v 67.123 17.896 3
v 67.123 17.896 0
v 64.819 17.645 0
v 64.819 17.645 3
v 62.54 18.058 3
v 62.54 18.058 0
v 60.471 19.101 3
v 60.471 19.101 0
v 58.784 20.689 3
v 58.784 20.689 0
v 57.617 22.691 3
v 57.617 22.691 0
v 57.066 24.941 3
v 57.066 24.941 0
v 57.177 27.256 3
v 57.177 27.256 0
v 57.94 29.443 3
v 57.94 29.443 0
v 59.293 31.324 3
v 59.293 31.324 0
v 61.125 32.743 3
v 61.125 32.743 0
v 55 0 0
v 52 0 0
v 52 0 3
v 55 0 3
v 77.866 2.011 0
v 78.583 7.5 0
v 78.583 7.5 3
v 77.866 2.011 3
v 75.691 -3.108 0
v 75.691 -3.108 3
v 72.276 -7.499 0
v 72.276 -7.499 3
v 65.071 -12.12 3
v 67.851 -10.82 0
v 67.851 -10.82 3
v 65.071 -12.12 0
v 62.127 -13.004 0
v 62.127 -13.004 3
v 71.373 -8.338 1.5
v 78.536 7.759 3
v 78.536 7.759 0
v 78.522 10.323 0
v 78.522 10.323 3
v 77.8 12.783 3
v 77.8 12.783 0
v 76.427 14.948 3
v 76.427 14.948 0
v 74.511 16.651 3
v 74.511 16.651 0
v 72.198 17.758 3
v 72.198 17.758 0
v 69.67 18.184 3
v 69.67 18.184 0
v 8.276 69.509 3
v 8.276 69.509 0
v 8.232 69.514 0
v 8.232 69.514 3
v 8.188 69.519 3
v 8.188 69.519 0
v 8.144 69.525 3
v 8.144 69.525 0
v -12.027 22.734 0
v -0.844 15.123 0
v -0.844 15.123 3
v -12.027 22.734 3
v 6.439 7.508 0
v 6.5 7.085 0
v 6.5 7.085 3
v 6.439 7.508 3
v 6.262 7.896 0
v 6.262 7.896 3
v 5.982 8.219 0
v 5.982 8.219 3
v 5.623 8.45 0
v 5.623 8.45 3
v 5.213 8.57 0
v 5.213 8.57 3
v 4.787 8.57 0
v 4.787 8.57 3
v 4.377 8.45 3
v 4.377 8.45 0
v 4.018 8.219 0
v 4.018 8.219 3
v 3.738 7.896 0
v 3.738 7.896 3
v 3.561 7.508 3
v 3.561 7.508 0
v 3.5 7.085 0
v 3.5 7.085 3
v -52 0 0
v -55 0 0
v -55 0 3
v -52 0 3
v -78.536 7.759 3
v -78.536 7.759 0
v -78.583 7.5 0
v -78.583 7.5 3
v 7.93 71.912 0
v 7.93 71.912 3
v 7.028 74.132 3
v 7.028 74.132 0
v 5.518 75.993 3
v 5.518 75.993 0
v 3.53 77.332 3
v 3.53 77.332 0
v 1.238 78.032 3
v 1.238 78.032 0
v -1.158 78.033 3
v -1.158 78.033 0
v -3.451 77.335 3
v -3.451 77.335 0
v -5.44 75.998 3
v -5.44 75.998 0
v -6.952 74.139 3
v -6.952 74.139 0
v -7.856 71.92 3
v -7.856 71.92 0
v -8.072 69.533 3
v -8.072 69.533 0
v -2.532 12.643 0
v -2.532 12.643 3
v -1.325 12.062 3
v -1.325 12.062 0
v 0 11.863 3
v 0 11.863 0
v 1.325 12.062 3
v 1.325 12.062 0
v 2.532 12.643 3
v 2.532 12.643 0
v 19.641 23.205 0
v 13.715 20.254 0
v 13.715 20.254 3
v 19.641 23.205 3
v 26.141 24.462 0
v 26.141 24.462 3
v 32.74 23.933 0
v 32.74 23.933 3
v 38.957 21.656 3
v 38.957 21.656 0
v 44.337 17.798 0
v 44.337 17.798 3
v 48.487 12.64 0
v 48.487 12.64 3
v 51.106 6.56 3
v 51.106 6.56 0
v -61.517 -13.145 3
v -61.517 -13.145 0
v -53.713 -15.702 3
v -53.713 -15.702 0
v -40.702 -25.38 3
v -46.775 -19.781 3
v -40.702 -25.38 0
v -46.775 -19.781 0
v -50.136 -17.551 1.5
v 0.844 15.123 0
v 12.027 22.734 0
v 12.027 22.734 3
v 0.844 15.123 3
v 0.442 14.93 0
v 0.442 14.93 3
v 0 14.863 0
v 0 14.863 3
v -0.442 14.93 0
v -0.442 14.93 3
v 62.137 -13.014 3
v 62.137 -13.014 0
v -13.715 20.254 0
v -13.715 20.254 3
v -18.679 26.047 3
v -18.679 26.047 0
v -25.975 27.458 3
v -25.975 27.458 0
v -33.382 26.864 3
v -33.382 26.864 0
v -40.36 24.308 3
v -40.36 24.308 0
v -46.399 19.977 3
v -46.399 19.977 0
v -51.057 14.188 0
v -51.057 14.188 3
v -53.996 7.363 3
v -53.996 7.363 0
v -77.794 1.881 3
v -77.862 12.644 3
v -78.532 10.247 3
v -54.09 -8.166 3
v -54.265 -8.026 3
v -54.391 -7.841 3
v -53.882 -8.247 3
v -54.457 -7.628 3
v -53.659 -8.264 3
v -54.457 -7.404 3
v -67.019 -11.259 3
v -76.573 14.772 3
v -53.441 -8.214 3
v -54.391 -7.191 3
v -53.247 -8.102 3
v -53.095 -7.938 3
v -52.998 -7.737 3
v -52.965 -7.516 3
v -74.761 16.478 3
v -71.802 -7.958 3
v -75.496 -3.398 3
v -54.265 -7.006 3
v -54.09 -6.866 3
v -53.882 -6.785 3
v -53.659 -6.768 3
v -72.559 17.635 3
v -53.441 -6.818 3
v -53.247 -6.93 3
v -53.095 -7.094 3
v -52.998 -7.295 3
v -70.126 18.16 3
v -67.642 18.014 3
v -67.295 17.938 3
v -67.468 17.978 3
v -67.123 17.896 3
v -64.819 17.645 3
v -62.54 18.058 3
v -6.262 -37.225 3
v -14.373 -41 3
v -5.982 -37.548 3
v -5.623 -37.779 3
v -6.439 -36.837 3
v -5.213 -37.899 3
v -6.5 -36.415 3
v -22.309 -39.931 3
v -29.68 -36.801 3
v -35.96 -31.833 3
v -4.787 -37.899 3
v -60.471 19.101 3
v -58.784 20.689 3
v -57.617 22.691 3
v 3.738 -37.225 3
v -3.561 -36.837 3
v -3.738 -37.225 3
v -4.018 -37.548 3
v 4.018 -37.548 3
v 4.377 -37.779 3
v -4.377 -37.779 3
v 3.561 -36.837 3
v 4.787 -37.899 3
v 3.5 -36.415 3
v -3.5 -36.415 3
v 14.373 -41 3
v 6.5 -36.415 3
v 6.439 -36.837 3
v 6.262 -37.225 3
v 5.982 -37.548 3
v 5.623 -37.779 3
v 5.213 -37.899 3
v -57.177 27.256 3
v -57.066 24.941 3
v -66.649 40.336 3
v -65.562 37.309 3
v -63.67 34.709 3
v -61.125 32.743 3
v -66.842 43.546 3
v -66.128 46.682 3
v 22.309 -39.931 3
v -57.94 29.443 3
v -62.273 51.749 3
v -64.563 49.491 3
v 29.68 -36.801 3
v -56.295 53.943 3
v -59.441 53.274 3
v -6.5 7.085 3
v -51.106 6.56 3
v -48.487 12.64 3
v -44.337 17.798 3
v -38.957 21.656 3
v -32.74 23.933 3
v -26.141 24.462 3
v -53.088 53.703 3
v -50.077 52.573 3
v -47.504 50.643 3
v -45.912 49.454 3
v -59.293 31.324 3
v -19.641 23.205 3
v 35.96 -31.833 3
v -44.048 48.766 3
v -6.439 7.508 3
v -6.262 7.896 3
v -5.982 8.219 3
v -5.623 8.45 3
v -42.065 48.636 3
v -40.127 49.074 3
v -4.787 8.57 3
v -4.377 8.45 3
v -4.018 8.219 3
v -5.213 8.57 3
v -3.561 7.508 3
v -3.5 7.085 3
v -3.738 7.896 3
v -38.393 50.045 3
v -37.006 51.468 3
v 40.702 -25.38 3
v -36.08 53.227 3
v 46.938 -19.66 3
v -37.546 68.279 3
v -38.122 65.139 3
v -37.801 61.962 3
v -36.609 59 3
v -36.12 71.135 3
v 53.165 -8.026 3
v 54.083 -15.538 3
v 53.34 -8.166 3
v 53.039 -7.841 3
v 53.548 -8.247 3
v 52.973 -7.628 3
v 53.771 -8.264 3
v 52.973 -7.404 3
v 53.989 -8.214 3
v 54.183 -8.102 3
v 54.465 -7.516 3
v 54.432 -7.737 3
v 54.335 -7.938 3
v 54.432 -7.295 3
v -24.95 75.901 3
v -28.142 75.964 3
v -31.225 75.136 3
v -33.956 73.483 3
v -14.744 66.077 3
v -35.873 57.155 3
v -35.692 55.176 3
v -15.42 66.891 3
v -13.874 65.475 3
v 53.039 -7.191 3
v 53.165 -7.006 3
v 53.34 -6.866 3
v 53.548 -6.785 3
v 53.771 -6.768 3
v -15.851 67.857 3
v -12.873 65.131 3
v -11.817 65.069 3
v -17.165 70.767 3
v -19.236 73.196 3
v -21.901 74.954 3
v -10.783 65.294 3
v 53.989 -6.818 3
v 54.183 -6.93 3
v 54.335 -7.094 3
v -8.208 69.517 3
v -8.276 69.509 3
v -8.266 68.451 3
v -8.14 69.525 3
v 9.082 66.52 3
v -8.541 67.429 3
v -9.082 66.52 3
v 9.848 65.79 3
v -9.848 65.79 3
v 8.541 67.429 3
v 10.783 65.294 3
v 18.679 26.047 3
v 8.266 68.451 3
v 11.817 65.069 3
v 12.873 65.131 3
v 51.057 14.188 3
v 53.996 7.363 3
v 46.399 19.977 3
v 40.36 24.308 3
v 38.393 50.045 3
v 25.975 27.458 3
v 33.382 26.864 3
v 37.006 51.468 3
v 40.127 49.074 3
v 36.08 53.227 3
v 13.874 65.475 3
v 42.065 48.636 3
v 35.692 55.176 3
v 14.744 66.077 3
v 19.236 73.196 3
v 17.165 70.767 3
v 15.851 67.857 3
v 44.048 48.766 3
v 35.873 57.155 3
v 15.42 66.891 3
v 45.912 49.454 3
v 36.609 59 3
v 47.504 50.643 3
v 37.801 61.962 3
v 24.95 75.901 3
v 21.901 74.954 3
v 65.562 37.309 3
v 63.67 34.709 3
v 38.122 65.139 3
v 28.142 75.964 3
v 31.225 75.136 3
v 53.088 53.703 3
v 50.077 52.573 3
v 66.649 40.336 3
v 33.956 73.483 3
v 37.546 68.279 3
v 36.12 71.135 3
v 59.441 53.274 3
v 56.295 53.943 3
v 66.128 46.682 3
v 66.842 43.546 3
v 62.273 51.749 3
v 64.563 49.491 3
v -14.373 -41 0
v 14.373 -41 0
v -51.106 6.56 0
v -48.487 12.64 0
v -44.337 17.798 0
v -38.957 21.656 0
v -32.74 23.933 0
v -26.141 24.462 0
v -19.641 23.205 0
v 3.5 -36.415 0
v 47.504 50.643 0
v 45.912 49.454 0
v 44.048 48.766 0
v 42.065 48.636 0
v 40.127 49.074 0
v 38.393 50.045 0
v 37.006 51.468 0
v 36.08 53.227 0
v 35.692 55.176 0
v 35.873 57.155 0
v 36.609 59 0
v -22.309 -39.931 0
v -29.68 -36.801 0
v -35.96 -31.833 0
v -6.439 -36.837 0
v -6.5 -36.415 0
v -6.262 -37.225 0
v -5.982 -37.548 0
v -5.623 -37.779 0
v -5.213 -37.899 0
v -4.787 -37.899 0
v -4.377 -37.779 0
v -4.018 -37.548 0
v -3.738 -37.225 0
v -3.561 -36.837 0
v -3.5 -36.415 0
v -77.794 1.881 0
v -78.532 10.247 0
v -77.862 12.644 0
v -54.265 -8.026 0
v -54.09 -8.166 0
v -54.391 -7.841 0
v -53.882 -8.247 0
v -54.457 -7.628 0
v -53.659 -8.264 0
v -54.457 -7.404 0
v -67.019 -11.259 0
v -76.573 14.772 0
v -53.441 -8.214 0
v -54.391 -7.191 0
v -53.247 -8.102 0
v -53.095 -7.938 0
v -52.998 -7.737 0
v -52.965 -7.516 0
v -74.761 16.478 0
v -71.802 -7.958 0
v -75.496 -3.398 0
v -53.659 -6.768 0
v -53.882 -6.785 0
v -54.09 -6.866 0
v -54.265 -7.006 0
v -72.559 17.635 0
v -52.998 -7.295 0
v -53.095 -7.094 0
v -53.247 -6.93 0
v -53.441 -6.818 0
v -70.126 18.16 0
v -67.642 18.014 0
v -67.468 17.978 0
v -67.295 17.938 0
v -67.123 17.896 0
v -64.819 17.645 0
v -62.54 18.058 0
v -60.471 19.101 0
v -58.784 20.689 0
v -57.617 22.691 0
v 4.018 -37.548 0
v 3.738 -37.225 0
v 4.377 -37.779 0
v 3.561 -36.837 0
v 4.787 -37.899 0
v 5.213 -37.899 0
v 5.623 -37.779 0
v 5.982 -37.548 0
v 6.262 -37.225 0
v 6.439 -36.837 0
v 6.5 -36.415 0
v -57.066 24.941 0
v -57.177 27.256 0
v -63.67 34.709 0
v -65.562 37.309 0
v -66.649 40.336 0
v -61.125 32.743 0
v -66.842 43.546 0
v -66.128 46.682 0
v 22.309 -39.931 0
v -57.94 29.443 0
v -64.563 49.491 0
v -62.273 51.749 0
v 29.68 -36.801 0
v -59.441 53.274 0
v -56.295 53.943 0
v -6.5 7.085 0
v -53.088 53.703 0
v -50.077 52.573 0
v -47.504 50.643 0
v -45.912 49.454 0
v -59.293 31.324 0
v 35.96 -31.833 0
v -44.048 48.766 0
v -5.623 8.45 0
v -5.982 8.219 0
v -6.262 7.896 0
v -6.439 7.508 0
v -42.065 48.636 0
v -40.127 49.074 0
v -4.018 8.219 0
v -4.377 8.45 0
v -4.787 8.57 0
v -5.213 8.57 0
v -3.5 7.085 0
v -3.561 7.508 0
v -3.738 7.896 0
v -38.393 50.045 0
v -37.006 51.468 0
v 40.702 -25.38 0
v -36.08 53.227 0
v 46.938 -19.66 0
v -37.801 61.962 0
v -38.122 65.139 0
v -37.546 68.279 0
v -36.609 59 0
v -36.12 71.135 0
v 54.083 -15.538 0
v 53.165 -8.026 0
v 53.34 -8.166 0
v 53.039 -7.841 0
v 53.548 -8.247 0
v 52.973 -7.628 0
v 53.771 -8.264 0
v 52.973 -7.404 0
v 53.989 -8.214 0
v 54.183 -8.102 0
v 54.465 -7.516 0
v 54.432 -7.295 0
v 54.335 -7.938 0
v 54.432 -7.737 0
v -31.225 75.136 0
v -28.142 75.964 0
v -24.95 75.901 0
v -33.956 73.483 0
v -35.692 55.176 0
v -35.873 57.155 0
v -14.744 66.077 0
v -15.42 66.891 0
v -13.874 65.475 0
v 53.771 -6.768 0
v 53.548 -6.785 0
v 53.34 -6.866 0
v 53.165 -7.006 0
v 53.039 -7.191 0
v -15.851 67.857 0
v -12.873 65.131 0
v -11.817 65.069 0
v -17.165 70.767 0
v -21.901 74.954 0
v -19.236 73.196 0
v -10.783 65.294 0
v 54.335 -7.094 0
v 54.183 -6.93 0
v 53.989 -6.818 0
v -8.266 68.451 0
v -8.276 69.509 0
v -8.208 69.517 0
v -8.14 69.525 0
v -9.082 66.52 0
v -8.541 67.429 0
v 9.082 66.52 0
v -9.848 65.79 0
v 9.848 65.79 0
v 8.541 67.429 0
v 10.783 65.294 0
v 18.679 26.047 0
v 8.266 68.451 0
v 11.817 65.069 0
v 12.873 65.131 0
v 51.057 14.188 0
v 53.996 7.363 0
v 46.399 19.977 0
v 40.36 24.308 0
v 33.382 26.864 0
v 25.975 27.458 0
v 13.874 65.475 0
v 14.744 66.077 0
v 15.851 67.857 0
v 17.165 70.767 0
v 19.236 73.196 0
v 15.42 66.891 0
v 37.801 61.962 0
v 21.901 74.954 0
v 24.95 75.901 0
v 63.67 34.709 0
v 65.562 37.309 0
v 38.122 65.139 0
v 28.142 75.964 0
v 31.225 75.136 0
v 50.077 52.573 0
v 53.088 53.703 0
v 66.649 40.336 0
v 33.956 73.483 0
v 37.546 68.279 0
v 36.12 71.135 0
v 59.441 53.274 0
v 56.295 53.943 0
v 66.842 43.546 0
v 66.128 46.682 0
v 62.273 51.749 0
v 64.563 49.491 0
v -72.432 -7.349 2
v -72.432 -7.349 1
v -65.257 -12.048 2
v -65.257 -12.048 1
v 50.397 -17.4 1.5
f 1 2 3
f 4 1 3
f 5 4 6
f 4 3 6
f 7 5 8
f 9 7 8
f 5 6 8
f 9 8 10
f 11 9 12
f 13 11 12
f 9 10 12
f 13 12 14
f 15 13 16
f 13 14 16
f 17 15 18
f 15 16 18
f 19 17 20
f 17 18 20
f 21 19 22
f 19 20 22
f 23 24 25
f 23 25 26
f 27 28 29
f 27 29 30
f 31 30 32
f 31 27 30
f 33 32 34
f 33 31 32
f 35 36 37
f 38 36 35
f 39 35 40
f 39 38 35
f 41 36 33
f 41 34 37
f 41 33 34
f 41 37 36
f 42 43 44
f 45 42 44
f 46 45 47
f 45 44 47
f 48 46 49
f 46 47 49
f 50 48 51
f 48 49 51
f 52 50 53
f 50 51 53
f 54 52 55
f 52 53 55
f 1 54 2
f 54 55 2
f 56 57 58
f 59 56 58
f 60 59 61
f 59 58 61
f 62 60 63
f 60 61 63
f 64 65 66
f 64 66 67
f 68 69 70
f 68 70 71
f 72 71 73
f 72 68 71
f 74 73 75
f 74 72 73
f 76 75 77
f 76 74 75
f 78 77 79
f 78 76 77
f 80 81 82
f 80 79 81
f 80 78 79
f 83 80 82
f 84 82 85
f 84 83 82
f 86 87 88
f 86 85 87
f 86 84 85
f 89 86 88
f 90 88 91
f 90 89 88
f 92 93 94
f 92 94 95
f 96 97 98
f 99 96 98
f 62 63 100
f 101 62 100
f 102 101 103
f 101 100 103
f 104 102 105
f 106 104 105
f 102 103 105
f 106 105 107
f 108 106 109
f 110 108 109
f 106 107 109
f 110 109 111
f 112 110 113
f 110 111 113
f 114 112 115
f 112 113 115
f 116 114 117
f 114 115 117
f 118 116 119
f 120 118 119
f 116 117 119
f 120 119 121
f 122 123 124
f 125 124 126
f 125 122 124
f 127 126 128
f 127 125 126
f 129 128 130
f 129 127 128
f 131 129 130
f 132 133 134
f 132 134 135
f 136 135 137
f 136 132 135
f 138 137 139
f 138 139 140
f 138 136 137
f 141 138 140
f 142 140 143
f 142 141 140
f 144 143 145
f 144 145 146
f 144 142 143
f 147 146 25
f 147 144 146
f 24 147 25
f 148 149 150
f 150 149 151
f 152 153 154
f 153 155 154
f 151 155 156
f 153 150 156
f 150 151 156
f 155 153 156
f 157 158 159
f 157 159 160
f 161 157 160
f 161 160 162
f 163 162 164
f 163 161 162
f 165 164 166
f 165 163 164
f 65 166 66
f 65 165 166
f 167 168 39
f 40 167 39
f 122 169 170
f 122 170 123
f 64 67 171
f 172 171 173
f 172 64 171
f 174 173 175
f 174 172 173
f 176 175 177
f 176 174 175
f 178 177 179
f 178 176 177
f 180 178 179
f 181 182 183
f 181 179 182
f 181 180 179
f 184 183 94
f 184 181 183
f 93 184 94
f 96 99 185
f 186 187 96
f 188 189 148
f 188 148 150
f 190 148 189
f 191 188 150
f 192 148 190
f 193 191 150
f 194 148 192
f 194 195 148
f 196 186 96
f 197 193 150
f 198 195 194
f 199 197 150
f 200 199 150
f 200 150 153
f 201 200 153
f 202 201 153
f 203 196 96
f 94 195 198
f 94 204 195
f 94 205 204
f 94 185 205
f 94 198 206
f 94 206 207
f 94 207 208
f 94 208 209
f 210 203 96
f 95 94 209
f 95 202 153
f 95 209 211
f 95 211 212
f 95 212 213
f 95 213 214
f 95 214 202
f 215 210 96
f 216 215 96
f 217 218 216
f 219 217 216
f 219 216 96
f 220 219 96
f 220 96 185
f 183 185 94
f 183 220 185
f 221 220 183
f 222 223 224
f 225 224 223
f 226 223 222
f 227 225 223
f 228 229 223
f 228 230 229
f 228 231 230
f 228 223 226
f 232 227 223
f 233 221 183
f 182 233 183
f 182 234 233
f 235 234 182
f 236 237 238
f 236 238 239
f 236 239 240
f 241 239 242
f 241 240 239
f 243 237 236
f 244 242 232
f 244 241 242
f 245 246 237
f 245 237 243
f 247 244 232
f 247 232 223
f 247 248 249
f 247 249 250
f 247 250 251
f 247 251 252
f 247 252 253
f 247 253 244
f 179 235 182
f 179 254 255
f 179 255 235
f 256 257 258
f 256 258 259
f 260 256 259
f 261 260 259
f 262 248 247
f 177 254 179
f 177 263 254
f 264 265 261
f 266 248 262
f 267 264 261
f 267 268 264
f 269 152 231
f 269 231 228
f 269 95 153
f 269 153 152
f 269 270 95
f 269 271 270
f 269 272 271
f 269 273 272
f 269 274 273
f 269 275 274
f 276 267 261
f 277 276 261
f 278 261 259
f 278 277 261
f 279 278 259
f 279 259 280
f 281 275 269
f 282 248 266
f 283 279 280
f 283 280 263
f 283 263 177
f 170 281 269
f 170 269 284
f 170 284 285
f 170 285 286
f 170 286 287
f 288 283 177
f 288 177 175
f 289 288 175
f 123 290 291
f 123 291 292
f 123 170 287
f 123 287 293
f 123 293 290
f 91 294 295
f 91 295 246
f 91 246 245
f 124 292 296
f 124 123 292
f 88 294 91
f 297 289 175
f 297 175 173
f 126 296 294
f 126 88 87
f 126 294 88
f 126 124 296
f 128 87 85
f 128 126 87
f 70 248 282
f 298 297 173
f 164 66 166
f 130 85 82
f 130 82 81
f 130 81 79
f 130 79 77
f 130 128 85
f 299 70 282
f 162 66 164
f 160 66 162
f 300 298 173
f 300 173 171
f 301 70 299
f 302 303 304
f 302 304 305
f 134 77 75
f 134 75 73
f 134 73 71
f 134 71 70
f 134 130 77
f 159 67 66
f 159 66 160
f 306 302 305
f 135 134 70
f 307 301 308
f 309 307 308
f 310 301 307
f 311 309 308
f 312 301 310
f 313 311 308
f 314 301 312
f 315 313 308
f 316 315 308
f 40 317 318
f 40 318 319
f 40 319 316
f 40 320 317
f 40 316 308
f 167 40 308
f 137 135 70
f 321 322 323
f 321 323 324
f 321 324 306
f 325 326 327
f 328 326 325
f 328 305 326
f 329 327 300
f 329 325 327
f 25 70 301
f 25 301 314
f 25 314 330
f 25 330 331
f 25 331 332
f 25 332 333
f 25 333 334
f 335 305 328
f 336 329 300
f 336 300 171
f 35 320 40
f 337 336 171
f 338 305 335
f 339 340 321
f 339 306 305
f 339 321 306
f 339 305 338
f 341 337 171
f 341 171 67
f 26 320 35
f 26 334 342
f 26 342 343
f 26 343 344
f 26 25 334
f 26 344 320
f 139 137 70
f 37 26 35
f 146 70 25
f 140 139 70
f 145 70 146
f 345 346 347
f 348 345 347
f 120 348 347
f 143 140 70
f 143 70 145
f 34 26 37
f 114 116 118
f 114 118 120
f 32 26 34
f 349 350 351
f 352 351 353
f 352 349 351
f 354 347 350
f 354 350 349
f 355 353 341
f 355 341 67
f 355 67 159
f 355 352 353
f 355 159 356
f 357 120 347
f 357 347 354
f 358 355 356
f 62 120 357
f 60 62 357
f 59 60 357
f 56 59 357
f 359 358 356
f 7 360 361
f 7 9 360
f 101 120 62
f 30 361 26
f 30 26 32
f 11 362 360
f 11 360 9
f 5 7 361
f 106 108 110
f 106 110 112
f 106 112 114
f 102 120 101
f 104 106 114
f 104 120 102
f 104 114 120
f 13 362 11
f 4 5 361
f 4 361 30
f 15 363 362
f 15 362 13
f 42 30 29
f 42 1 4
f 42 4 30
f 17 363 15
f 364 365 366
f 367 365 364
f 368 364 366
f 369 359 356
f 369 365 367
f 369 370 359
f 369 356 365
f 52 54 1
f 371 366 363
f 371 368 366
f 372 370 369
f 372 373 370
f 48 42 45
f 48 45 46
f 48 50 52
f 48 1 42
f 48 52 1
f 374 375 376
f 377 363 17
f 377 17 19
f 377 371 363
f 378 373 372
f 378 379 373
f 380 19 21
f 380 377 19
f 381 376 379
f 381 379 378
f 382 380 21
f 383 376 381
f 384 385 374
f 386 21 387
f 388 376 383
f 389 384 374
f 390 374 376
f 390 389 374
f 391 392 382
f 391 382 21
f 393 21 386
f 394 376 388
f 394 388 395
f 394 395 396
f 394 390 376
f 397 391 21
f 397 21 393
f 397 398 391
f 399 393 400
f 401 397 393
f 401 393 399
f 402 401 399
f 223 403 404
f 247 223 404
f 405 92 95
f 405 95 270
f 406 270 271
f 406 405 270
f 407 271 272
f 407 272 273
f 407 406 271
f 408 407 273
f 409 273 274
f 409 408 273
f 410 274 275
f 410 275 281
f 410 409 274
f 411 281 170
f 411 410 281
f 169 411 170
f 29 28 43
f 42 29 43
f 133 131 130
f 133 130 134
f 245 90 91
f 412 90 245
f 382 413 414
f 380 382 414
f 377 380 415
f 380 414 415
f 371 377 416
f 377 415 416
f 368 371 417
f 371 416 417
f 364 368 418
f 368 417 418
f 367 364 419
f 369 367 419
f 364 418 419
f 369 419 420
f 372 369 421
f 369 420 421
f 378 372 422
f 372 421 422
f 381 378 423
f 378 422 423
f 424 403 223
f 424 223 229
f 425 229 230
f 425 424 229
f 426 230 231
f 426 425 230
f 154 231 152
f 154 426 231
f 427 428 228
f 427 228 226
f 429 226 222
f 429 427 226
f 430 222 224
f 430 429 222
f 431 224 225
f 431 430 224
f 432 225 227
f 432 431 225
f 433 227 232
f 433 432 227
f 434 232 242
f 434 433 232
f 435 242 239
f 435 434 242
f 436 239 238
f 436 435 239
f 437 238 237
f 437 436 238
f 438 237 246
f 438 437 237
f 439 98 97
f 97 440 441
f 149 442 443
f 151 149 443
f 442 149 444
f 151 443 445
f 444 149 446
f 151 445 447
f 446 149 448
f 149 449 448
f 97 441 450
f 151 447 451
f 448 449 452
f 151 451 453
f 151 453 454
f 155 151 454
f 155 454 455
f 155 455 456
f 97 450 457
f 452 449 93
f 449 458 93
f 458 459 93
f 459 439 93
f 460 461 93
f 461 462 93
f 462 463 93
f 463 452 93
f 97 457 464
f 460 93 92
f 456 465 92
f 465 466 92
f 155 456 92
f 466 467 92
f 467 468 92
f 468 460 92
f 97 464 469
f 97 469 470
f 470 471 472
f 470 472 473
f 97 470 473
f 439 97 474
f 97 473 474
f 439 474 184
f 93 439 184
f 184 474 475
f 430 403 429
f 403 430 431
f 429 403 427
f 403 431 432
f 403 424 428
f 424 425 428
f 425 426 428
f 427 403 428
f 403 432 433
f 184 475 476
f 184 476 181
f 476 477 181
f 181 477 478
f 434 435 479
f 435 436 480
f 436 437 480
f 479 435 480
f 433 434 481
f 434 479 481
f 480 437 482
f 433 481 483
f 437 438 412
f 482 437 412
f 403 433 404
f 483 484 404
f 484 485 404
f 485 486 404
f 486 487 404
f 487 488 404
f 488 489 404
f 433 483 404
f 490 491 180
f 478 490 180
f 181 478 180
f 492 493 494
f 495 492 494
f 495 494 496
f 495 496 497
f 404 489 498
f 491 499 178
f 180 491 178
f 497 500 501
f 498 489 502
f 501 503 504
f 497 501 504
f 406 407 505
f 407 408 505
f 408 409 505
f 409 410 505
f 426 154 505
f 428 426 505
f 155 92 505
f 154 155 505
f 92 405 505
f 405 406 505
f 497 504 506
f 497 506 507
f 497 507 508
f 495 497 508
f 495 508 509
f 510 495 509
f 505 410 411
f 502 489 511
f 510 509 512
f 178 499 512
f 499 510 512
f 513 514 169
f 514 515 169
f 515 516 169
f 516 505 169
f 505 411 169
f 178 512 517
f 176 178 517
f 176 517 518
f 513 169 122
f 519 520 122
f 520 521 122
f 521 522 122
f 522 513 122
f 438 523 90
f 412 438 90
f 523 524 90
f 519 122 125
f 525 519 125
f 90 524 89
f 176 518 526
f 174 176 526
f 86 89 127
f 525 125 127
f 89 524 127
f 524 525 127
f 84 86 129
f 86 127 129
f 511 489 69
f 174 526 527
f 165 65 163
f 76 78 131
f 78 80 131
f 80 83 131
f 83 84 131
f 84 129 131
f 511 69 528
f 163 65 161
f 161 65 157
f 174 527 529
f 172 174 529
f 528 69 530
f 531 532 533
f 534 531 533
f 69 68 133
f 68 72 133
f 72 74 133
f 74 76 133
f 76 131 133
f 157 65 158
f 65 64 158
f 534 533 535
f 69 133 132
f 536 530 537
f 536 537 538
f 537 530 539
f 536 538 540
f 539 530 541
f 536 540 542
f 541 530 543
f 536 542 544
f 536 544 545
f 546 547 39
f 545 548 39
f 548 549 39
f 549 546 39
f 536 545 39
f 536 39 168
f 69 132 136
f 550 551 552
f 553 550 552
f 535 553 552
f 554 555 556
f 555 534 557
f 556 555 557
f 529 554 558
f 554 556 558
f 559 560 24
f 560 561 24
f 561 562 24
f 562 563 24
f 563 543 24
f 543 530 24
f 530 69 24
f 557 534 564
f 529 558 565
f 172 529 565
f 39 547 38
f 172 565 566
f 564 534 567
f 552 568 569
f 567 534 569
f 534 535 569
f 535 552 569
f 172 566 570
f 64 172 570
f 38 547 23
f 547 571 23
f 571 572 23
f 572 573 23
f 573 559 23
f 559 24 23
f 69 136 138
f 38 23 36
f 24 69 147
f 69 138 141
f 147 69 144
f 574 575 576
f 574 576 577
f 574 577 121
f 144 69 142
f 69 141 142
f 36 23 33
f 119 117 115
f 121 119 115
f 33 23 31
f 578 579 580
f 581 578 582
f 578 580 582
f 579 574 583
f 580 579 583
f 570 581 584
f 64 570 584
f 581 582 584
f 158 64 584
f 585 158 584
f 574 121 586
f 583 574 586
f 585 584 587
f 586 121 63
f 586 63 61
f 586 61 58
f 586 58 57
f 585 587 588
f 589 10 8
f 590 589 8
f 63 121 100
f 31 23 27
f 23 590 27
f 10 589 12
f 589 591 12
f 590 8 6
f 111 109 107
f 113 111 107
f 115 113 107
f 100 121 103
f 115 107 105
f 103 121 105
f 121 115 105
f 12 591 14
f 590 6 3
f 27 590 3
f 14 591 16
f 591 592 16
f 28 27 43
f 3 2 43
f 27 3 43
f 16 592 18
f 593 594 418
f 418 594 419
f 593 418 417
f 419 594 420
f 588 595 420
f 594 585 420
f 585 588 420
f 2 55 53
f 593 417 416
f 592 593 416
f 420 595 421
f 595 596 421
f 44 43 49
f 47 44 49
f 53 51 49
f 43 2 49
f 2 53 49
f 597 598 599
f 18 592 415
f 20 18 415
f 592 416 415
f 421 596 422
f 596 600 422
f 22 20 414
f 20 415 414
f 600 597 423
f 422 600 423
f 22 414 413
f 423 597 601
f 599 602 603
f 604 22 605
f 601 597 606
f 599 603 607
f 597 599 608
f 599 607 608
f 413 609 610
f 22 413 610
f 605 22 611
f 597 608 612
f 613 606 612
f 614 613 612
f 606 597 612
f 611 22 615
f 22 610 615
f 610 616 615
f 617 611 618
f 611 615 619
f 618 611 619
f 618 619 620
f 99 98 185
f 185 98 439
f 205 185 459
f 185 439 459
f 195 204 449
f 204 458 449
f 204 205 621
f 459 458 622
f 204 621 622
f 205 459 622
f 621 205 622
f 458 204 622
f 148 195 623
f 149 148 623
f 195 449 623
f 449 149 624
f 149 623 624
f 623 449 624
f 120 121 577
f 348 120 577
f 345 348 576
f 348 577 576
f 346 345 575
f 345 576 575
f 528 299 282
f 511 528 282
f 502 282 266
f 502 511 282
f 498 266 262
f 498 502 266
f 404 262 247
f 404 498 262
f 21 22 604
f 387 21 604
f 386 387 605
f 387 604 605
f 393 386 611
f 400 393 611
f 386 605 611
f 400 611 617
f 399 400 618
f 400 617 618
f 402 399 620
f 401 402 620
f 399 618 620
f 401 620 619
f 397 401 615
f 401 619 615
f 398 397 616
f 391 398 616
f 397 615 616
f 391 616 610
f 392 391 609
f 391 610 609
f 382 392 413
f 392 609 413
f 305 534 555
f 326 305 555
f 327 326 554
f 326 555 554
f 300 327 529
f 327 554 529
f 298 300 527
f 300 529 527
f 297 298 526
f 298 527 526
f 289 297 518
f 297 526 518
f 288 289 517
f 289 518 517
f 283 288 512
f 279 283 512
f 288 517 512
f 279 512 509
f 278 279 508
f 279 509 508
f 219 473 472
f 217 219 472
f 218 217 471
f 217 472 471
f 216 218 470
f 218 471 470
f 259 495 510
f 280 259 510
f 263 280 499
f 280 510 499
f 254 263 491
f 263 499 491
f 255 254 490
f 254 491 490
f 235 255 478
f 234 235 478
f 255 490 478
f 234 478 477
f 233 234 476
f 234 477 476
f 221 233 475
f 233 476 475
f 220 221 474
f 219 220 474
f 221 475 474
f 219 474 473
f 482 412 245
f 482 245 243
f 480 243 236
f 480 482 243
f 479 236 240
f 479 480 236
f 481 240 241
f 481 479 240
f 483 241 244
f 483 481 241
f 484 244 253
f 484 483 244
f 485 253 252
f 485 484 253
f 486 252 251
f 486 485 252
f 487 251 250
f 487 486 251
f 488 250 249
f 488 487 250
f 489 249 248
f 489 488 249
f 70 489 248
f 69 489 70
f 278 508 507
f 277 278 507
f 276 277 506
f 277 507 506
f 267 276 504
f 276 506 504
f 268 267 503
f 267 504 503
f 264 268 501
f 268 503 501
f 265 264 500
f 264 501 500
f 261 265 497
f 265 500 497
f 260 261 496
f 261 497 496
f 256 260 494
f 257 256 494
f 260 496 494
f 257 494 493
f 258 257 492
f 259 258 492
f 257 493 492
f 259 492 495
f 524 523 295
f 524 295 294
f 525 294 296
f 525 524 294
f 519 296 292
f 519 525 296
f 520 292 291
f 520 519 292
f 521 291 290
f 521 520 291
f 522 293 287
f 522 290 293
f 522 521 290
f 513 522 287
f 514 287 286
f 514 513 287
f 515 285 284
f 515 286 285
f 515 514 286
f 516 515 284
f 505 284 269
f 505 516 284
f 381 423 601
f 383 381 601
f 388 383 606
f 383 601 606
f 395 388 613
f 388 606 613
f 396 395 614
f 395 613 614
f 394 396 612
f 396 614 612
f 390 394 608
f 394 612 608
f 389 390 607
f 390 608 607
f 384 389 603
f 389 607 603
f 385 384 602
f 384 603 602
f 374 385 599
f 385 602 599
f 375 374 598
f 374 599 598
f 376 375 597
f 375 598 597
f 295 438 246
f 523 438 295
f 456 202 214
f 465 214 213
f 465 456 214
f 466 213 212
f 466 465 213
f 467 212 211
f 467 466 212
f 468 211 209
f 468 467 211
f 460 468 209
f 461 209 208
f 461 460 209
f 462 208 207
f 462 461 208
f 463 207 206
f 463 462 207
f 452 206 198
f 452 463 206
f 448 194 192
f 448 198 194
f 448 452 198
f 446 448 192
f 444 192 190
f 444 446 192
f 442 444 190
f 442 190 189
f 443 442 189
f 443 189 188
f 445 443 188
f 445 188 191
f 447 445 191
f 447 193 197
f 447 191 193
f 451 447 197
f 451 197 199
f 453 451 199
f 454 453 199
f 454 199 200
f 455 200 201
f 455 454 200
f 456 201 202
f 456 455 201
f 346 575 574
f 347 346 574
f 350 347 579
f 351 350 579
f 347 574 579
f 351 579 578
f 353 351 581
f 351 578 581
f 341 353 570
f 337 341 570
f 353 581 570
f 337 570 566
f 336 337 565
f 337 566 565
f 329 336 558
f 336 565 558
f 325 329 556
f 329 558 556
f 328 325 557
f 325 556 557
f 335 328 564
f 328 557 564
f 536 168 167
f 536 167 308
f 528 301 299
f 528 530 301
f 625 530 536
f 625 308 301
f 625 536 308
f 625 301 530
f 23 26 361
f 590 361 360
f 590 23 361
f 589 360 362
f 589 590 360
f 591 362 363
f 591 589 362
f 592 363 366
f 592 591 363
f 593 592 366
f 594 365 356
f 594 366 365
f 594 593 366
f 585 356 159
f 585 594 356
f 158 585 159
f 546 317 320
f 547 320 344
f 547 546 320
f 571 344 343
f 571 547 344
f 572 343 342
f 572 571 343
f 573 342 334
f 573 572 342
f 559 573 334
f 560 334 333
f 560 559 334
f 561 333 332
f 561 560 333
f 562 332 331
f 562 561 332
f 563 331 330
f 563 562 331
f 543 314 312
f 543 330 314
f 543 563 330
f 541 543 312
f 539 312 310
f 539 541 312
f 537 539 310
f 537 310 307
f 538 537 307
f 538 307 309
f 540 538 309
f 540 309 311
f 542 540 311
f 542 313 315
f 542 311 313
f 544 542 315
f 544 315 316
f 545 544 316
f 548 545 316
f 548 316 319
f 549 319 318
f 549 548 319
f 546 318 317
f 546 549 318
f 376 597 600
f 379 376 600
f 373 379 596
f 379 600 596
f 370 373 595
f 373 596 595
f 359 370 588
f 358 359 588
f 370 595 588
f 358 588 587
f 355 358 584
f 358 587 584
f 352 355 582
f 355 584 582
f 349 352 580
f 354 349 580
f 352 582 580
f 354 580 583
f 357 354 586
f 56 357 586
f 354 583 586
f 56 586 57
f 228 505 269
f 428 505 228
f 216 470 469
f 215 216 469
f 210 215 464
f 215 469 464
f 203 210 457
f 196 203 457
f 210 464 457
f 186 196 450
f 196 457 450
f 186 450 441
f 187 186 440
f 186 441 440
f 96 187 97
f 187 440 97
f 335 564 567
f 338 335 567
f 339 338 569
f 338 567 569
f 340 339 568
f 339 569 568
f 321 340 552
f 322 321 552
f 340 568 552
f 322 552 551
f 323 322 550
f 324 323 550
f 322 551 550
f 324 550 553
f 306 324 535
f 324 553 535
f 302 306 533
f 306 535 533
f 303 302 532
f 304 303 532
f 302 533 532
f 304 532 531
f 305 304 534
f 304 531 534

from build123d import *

# Parameters (mm, degrees)
BOSS_EXTRUDE3_DEPTH      = 3
BOSS_EXTRUDE4_DEPTH      = 3
CUT_EXTRUDE11_DEPTH      = 111.873556651
CUT_EXTRUDE11_DEPTH_BACK = 111.873556651
SKETCH6_W                = 30
SKETCH6_H                = 41
BOSS_EXTRUDE5_DEPTH      = 40
SKETCH7_W                = 88.745964224
SKETCH7_H                = 3
BOSS_EXTRUDE6_DEPTH      = 41
CUT_EXTRUDE12_DEPTH      = 118.830155579
CUT_EXTRUDE12_DEPTH_BACK = 118.830155579
BOSS_EXTRUDE7_DEPTH      = 3
CUT_EXTRUDE13_START      = 3
SKETCH11_W               = 10
SKETCH11_H               = 13.79344676
CUT_EXTRUDE13_DEPTH      = 41
SKETCH12_R               = 1.55
CUT_EXTRUDE14_DEPTH      = 118.830155613
CUT_EXTRUDE14_DEPTH_BACK = 118.830155613
SKETCH13_R               = 0.75
CUT_EXTRUDE15_DEPTH      = 118.830155613
CUT_EXTRUDE15_DEPTH_BACK = 118.830155613
CUT_EXTRUDE17_START      = 3
SKETCH14_W               = 30.416262865
SKETCH14_H               = 42.907687787
CUT_EXTRUDE17_DEPTH      = 41
SKETCH16_R               = 1.5
CUT_EXTRUDE19_DEPTH      = 111.873556651
CUT_EXTRUDE19_DEPTH_BACK = 111.873556651


with BuildPart() as part:
    # Sketch2 → Boss-Extrude3 (new body)
    with BuildSketch(Plane.XY):
        with BuildLine():
            ThreePointArc((47.50430531, 50.643316247), (38.392532309, 50.044854207), (36.609276159, 59.000442494))
            ThreePointArc((36.609276159, 59.000442494), (31.22500556, 75.135535905), (15.851175796, 67.857008055))
            ThreePointArc((15.851175796, 67.857008055), (11.292148271, 65.146162721), (8.27578906, 69.509073619))
            ThreePointArc((8.27578906, 69.509073619), (8.209835801, 69.516894322), (8.143875152, 69.524652444))
            ThreePointArc((8.143875152, 69.524652444), (0.040205316, 78.121761213), (-8.072309219, 69.532998094))
            ThreePointArc((-8.072309219, 69.532998094), (-8.174057892, 69.521110302), (-8.27578906, 69.509073619))
            ThreePointArc((-8.27578906, 69.509073619), (-11.292148299, 65.146162715), (-15.851175812, 67.857008111))
            ThreePointArc((-15.851175812, 67.857008111), (-31.225005545, 75.135535912), (-36.609276205, 59.000442573))
            ThreePointArc((-36.609276205, 59.000442573), (-38.39253227, 50.044854237), (-47.504305306, 50.643316242))
            ThreePointArc((-47.504305306, 50.643316242), (-64.562942613, 49.491387864), (-61.124617501, 32.743194941))
            ThreePointArc((-61.124617501, 32.743194941), (-57.616854175, 22.690844698), (-67.122680626, 17.895700022))
            ThreePointArc((-67.122680626, 17.895700022), (-67.381711192, 17.958536274), (-67.642453618, 18.013841027))
            ThreePointArc((-67.642453618, 18.013841027), (-78.427805312, 10.854202298), (-71.372982112, 0))
            Line((-71.372982112, 0), (71.372982112, 0))
            ThreePointArc((71.372982112, 0), (78.369977301, 11.114396723), (67.122680666, 17.895700032))
            ThreePointArc((67.122680666, 17.895700032), (57.616854183, 22.690844679), (61.124617501, 32.743194941))
            ThreePointArc((61.124617501, 32.743194941), (64.562942615, 49.491387862), (47.50430531, 50.643316247))
        make_face()
    extrude(amount=BOSS_EXTRUDE3_DEPTH)

    # Sketch4 → Boss-Extrude4 (add)
    with BuildSketch(Plane.XY):
        with BuildLine():
            Line((-44.372982112, 0), (-57.872982112, 0))
            Line((-57.872982112, 0), (-57.872982112, -13.5))
            ThreePointArc((-57.872982112, -13.5), (-50.941516146, -11.584678656), (-45.97686273, -6.382189564))
            ThreePointArc((-45.97686273, -6.382189564), (-45.287489461, -3.162806043), (-44.372982112, 0))
        make_face()
        with BuildLine():
            Line((-57.872982112, -13.5), (-57.872982112, 0))
            Line((-57.872982112, 0), (-71.372982112, 0))
            ThreePointArc((-71.372982112, 0), (-67.418923658, -9.545941546), (-57.872982112, -13.5))
        make_face()
        with BuildLine():
            Line((-57.872982112, -13.502334306), (-57.872982112, -13.5))
            ThreePointArc((-57.872982112, -13.5), (-67.418923658, -9.545941546), (-71.372982112, 0))
            ThreePointArc((-71.372982112, 0), (-72.451224877, 0.304022071), (-73.484512677, 0.73686523))
            ThreePointArc((-73.484512677, 0.73686523), (-74.477917841, 1.305497745), (-75.393009288, 1.993105481))
            ThreePointArc((-75.393009288, 1.993105481), (-76.19177077, 2.763005392), (-76.892036557, 3.623466668))
            ThreePointArc((-76.892036557, 3.623466668), (-77.482473018, 4.559883509), (-77.956141708, 5.560448192))
            ThreePointArc((-77.956141708, 5.560448192), (-78.314438673, 6.641735343), (-78.536342603, 7.759016536))
            Line((-78.536342603, 7.759016536), (-78.5829279, 7.5))
            add(Edge.make_bspline(
                [(-78.5829279, 7.5), (-78.619378381, 2.110973886), (-75.05397773, -6.403058313), (-65.775580858, -12.380201513), (-60.383408465, -13.5022688), (-57.872982112, -13.502334306)],
                knots=[0, 0, 0, 0, 0.497531388, 0.760341967, 0.99111058, 0.99111058, 0.99111058, 0.99111058], degree=3))
        make_face()
        with BuildLine():
            Line((57.872982112, 0), (44.372982112, 0))
            ThreePointArc((44.372982112, 0), (45.287489461, -3.162806043), (45.97686273, -6.382189564))
            ThreePointArc((45.97686273, -6.382189564), (50.899542414, -11.559461007), (57.775049798, -13.499644783))
            add(Edge.make_bspline(
                [(57.872982112, -13.498764325), (57.840342719, -13.499136412), (57.807698516, -13.49942994), (57.775049798, -13.499644783)],
                knots=[0.991262366, 0.991262366, 0.991262366, 0.991262366, 0.994213276, 0.994213276, 0.994213276, 0.994213276], degree=3))
            Line((57.872982112, -13.498764325), (57.872982112, 0))
        make_face()
        with BuildLine():
            Line((71.372982112, 0), (57.872982112, 0))
            Line((57.872982112, 0), (57.872982112, -13.498764325))
            add(Edge.make_bspline(
                [(58.880524263, -13.462349677), (58.545403195, -13.482744614), (58.209448198, -13.494928627), (57.872982112, -13.498764325)],
                knots=[0.960842647, 0.960842647, 0.960842647, 0.960842647, 0.991262366, 0.991262366, 0.991262366, 0.991262366], degree=3))
            ThreePointArc((58.880524263, -13.462349677), (67.768734207, -9.182814954), (71.372982112, 0))
        make_face()
        with BuildLine():
            ThreePointArc((73.484512677, 0.73686523), (72.451224877, 0.304022071), (71.372982112, 0))
            ThreePointArc((71.372982112, 0), (67.768734207, -9.182814954), (58.880524263, -13.462349677))
            add(Edge.make_bspline(
                [(78.5829279, 7.5), (78.674659632, 1.535679134), (73.703653617, -8.978697254), (63.479979045, -13.182434147), (58.880524263, -13.462349677)],
                knots=[0, 0, 0, 0, 0.543339428, 0.960842647, 0.960842647, 0.960842647, 0.960842647], degree=3))
            Line((78.5829279, 7.5), (78.536342603, 7.759016536))
            ThreePointArc((78.536342603, 7.759016536), (78.314438673, 6.641735343), (77.956141708, 5.560448192))
            ThreePointArc((77.956141708, 5.560448192), (77.482473018, 4.559883509), (76.892036557, 3.623466668))
            ThreePointArc((76.892036557, 3.623466668), (76.19177077, 2.763005392), (75.393009288, 1.993105481))
            ThreePointArc((75.393009288, 1.993105481), (74.477917841, 1.305497745), (73.484512677, 0.73686523))
        make_face()
    extrude(amount=BOSS_EXTRUDE4_DEPTH)

    # Sketch5 → Cut-Extrude11 (cut, two sides)
    with BuildSketch(Plane.XY) as cut_extrude11_sk:
        with BuildLine():
            ThreePointArc((-12.027368937, 22.734284418), (-40.359872584, 24.307893309), (-55, 0))
            Line((-55, 0), (-52, 0))
            ThreePointArc((-52, 0), (-38.956977393, 21.65612313), (-13.715292326, 20.254180663))
            Line((-13.715292326, 20.254180663), (-2.531885083, 12.64291254))
            ThreePointArc((-2.531885083, 12.64291254), (0, 11.863068172), (2.531885083, 12.64291254))
            Line((2.531885083, 12.64291254), (13.715292326, 20.254180663))
            ThreePointArc((13.715292326, 20.254180663), (38.956977393, 21.65612313), (52, 0))
            Line((52, 0), (55, 0))
            ThreePointArc((55, 0), (40.359872584, 24.307893309), (12.027368937, 22.734284418))
            Line((12.027368937, 22.734284418), (0.843961694, 15.123016295))
            ThreePointArc((0.843961694, 15.123016295), (0, 14.863068172), (-0.843961694, 15.123016295))
            Line((-0.843961694, 15.123016295), (-12.027368937, 22.734284418))
        make_face()
    extrude(amount=CUT_EXTRUDE11_DEPTH, mode=Mode.SUBTRACT)
    extrude(cut_extrude11_sk.sketch, amount=-CUT_EXTRUDE11_DEPTH_BACK, mode=Mode.SUBTRACT)

    # Sketch6 → Boss-Extrude5 (add)
    with BuildSketch(Plane.XY):
        with Locations((0, -20.5)):
            Rectangle(SKETCH6_W, SKETCH6_H)
    extrude(amount=BOSS_EXTRUDE5_DEPTH)

    # Sketch7 → Boss-Extrude6 (add)
    with BuildSketch(Plane(origin=(0, 0, 0), x_dir=(1, 0, 0), z_dir=(0, 1, 0))):
        with Locations((0, -1.5)):
            Rectangle(SKETCH7_W, SKETCH7_H)
    extrude(amount=-BOSS_EXTRUDE6_DEPTH)

    # Sketch8 → Cut-Extrude12 (cut, two sides)
    with BuildSketch(Plane.XY) as cut_extrude12_sk:
        with BuildLine():
            Line((44.372982112, -41), (44.372982112, -11))
            ThreePointArc((44.372982112, -11), (35.586185548, -32.213203436), (14.372982112, -41))
            Line((14.372982112, -41), (44.372982112, -41))
        make_face()
        with BuildLine():
            Line((0, -46.518418556), (0, -41))
            Line((0, -41), (-14.372982112, -41))
            ThreePointArc((-14.372982112, -41), (-35.586185548, -32.213203436), (-44.372982112, -11))
            Line((-44.372982112, -11), (-44.372982112, -46.518418556))
            Line((-44.372982112, -46.518418556), (0, -46.518418556))
        make_face()
        Polygon((44.372982112, -46.518418556), (44.372982112, -41), (14.372982112, -41), (0, -41), (0, -46.518418556), align=None)
    extrude(amount=CUT_EXTRUDE12_DEPTH, mode=Mode.SUBTRACT)
    extrude(cut_extrude12_sk.sketch, amount=-CUT_EXTRUDE12_DEPTH_BACK, mode=Mode.SUBTRACT)

    # Sketch10 → Boss-Extrude7 (add)
    with BuildSketch(Plane.XY):
        with BuildLine():
            Line((-62.137396583, -13.014276789), (-43.035731637, 6.087388157))
            Line((-43.035731637, 6.087388157), (-28.63207452, -11.418368831))
            Line((-28.63207452, -11.418368831), (-35.806723464, -31.990348537))
            add(Edge.make_bspline(
                [(-62.137396583, -13.014276789), (-45.493525683, -16.38886663), (-35.806723464, -31.990348537)],
                knots=[0, 0, 0, 1, 1, 1], degree=2))
        make_face()
        with BuildLine():
            Line((43.035731637, 6.087388157), (28.63207452, -11.418368831))
            Line((28.63207452, -11.418368831), (35.806723464, -31.990348537))
            add(Edge.make_bspline(
                [(62.137396583, -13.014276789), (45.493525683, -16.38886663), (35.806723464, -31.990348537)],
                knots=[0, 0, 0, 1, 1, 1], degree=2))
            Line((62.137396583, -13.014276789), (43.035731637, 6.087388157))
        make_face()
    extrude(amount=BOSS_EXTRUDE7_DEPTH)

    # Sketch11 → Cut-Extrude13 (cut)
    with BuildSketch(Plane.XY.offset(CUT_EXTRUDE13_START)):
        with Locations((-10, -20.49672338)):
            Rectangle(SKETCH11_W, SKETCH11_H)
        with Locations((10, -20.49672338)):
            Rectangle(SKETCH11_W, SKETCH11_H)
    extrude(amount=CUT_EXTRUDE13_DEPTH, mode=Mode.SUBTRACT)

    # Sketch12 → Cut-Extrude14 (cut, two sides)
    with BuildSketch(Plane(origin=(0, 0, 0), x_dir=(1, 0, 0), z_dir=(0, 1, 0))) as cut_extrude14_sk:
        with Locations(Location((0, -24, 0), (0, 0, 270))):
            Circle(SKETCH12_R)
    extrude(amount=CUT_EXTRUDE14_DEPTH, mode=Mode.SUBTRACT)
    extrude(cut_extrude14_sk.sketch, amount=-CUT_EXTRUDE14_DEPTH_BACK, mode=Mode.SUBTRACT)

    # Sketch13 → Cut-Extrude15 (cut, two sides)
    with BuildSketch(Plane.XY) as cut_extrude15_sk:
        with Locations((-53.715002972, -7.515993868)):
            Circle(SKETCH13_R)
        with Locations((53.715002972, -7.515993868)):
            Circle(SKETCH13_R)
    extrude(amount=CUT_EXTRUDE15_DEPTH, mode=Mode.SUBTRACT)
    extrude(cut_extrude15_sk.sketch, amount=-CUT_EXTRUDE15_DEPTH_BACK, mode=Mode.SUBTRACT)

    # Sketch14 → Cut-Extrude17 (cut)
    with BuildSketch(Plane.XY.offset(CUT_EXTRUDE17_START)):
        with Locations((0.208131432, -21.453843894)):
            Rectangle(SKETCH14_W, SKETCH14_H)
    extrude(amount=CUT_EXTRUDE17_DEPTH, mode=Mode.SUBTRACT)

    # Sketch16 → Cut-Extrude19 (cut, two sides)
    with BuildSketch(Plane.XY) as cut_extrude19_sk:
        with Locations((-5, 7.085495567)):
            Circle(SKETCH16_R)
        with Locations((5, 7.085495567)):
            Circle(SKETCH16_R)
        with BuildLine():
            ThreePointArc((6.5, 7.085495567), (5, 5.585495567), (3.5, 7.085495567))
            Line((3.5, 7.085495567), (3.5, -34.074581897))
            Line((3.5, -34.074581897), (3.5, -36.414504433))
            ThreePointArc((3.5, -36.414504433), (5, -34.914504433), (6.5, -36.414504433))
            Line((6.5, -36.414504433), (6.5, -34.074581897))
            Line((6.5, -34.074581897), (6.5, 7.085495567))
        make_face()
        with BuildLine():
            ThreePointArc((-3.5, 7.085495567), (-5, 5.585495567), (-6.5, 7.085495567))
            Line((-6.5, 7.085495567), (-6.5, -34.074581897))
            Line((-6.5, -34.074581897), (-6.5, -36.414504433))
            ThreePointArc((-6.5, -36.414504433), (-5, -34.914504433), (-3.5, -36.414504433))
            Line((-3.5, -36.414504433), (-3.5, -34.074581897))
            Line((-3.5, -34.074581897), (-3.5, 7.085495567))
        make_face()
        with Locations((-5, -36.414504433)):
            Circle(SKETCH16_R)
        with Locations((5, -36.414504433)):
            Circle(SKETCH16_R)
    extrude(amount=CUT_EXTRUDE19_DEPTH, mode=Mode.SUBTRACT)
    extrude(cut_extrude19_sk.sketch, amount=-CUT_EXTRUDE19_DEPTH_BACK, mode=Mode.SUBTRACT)


solid = part.part
